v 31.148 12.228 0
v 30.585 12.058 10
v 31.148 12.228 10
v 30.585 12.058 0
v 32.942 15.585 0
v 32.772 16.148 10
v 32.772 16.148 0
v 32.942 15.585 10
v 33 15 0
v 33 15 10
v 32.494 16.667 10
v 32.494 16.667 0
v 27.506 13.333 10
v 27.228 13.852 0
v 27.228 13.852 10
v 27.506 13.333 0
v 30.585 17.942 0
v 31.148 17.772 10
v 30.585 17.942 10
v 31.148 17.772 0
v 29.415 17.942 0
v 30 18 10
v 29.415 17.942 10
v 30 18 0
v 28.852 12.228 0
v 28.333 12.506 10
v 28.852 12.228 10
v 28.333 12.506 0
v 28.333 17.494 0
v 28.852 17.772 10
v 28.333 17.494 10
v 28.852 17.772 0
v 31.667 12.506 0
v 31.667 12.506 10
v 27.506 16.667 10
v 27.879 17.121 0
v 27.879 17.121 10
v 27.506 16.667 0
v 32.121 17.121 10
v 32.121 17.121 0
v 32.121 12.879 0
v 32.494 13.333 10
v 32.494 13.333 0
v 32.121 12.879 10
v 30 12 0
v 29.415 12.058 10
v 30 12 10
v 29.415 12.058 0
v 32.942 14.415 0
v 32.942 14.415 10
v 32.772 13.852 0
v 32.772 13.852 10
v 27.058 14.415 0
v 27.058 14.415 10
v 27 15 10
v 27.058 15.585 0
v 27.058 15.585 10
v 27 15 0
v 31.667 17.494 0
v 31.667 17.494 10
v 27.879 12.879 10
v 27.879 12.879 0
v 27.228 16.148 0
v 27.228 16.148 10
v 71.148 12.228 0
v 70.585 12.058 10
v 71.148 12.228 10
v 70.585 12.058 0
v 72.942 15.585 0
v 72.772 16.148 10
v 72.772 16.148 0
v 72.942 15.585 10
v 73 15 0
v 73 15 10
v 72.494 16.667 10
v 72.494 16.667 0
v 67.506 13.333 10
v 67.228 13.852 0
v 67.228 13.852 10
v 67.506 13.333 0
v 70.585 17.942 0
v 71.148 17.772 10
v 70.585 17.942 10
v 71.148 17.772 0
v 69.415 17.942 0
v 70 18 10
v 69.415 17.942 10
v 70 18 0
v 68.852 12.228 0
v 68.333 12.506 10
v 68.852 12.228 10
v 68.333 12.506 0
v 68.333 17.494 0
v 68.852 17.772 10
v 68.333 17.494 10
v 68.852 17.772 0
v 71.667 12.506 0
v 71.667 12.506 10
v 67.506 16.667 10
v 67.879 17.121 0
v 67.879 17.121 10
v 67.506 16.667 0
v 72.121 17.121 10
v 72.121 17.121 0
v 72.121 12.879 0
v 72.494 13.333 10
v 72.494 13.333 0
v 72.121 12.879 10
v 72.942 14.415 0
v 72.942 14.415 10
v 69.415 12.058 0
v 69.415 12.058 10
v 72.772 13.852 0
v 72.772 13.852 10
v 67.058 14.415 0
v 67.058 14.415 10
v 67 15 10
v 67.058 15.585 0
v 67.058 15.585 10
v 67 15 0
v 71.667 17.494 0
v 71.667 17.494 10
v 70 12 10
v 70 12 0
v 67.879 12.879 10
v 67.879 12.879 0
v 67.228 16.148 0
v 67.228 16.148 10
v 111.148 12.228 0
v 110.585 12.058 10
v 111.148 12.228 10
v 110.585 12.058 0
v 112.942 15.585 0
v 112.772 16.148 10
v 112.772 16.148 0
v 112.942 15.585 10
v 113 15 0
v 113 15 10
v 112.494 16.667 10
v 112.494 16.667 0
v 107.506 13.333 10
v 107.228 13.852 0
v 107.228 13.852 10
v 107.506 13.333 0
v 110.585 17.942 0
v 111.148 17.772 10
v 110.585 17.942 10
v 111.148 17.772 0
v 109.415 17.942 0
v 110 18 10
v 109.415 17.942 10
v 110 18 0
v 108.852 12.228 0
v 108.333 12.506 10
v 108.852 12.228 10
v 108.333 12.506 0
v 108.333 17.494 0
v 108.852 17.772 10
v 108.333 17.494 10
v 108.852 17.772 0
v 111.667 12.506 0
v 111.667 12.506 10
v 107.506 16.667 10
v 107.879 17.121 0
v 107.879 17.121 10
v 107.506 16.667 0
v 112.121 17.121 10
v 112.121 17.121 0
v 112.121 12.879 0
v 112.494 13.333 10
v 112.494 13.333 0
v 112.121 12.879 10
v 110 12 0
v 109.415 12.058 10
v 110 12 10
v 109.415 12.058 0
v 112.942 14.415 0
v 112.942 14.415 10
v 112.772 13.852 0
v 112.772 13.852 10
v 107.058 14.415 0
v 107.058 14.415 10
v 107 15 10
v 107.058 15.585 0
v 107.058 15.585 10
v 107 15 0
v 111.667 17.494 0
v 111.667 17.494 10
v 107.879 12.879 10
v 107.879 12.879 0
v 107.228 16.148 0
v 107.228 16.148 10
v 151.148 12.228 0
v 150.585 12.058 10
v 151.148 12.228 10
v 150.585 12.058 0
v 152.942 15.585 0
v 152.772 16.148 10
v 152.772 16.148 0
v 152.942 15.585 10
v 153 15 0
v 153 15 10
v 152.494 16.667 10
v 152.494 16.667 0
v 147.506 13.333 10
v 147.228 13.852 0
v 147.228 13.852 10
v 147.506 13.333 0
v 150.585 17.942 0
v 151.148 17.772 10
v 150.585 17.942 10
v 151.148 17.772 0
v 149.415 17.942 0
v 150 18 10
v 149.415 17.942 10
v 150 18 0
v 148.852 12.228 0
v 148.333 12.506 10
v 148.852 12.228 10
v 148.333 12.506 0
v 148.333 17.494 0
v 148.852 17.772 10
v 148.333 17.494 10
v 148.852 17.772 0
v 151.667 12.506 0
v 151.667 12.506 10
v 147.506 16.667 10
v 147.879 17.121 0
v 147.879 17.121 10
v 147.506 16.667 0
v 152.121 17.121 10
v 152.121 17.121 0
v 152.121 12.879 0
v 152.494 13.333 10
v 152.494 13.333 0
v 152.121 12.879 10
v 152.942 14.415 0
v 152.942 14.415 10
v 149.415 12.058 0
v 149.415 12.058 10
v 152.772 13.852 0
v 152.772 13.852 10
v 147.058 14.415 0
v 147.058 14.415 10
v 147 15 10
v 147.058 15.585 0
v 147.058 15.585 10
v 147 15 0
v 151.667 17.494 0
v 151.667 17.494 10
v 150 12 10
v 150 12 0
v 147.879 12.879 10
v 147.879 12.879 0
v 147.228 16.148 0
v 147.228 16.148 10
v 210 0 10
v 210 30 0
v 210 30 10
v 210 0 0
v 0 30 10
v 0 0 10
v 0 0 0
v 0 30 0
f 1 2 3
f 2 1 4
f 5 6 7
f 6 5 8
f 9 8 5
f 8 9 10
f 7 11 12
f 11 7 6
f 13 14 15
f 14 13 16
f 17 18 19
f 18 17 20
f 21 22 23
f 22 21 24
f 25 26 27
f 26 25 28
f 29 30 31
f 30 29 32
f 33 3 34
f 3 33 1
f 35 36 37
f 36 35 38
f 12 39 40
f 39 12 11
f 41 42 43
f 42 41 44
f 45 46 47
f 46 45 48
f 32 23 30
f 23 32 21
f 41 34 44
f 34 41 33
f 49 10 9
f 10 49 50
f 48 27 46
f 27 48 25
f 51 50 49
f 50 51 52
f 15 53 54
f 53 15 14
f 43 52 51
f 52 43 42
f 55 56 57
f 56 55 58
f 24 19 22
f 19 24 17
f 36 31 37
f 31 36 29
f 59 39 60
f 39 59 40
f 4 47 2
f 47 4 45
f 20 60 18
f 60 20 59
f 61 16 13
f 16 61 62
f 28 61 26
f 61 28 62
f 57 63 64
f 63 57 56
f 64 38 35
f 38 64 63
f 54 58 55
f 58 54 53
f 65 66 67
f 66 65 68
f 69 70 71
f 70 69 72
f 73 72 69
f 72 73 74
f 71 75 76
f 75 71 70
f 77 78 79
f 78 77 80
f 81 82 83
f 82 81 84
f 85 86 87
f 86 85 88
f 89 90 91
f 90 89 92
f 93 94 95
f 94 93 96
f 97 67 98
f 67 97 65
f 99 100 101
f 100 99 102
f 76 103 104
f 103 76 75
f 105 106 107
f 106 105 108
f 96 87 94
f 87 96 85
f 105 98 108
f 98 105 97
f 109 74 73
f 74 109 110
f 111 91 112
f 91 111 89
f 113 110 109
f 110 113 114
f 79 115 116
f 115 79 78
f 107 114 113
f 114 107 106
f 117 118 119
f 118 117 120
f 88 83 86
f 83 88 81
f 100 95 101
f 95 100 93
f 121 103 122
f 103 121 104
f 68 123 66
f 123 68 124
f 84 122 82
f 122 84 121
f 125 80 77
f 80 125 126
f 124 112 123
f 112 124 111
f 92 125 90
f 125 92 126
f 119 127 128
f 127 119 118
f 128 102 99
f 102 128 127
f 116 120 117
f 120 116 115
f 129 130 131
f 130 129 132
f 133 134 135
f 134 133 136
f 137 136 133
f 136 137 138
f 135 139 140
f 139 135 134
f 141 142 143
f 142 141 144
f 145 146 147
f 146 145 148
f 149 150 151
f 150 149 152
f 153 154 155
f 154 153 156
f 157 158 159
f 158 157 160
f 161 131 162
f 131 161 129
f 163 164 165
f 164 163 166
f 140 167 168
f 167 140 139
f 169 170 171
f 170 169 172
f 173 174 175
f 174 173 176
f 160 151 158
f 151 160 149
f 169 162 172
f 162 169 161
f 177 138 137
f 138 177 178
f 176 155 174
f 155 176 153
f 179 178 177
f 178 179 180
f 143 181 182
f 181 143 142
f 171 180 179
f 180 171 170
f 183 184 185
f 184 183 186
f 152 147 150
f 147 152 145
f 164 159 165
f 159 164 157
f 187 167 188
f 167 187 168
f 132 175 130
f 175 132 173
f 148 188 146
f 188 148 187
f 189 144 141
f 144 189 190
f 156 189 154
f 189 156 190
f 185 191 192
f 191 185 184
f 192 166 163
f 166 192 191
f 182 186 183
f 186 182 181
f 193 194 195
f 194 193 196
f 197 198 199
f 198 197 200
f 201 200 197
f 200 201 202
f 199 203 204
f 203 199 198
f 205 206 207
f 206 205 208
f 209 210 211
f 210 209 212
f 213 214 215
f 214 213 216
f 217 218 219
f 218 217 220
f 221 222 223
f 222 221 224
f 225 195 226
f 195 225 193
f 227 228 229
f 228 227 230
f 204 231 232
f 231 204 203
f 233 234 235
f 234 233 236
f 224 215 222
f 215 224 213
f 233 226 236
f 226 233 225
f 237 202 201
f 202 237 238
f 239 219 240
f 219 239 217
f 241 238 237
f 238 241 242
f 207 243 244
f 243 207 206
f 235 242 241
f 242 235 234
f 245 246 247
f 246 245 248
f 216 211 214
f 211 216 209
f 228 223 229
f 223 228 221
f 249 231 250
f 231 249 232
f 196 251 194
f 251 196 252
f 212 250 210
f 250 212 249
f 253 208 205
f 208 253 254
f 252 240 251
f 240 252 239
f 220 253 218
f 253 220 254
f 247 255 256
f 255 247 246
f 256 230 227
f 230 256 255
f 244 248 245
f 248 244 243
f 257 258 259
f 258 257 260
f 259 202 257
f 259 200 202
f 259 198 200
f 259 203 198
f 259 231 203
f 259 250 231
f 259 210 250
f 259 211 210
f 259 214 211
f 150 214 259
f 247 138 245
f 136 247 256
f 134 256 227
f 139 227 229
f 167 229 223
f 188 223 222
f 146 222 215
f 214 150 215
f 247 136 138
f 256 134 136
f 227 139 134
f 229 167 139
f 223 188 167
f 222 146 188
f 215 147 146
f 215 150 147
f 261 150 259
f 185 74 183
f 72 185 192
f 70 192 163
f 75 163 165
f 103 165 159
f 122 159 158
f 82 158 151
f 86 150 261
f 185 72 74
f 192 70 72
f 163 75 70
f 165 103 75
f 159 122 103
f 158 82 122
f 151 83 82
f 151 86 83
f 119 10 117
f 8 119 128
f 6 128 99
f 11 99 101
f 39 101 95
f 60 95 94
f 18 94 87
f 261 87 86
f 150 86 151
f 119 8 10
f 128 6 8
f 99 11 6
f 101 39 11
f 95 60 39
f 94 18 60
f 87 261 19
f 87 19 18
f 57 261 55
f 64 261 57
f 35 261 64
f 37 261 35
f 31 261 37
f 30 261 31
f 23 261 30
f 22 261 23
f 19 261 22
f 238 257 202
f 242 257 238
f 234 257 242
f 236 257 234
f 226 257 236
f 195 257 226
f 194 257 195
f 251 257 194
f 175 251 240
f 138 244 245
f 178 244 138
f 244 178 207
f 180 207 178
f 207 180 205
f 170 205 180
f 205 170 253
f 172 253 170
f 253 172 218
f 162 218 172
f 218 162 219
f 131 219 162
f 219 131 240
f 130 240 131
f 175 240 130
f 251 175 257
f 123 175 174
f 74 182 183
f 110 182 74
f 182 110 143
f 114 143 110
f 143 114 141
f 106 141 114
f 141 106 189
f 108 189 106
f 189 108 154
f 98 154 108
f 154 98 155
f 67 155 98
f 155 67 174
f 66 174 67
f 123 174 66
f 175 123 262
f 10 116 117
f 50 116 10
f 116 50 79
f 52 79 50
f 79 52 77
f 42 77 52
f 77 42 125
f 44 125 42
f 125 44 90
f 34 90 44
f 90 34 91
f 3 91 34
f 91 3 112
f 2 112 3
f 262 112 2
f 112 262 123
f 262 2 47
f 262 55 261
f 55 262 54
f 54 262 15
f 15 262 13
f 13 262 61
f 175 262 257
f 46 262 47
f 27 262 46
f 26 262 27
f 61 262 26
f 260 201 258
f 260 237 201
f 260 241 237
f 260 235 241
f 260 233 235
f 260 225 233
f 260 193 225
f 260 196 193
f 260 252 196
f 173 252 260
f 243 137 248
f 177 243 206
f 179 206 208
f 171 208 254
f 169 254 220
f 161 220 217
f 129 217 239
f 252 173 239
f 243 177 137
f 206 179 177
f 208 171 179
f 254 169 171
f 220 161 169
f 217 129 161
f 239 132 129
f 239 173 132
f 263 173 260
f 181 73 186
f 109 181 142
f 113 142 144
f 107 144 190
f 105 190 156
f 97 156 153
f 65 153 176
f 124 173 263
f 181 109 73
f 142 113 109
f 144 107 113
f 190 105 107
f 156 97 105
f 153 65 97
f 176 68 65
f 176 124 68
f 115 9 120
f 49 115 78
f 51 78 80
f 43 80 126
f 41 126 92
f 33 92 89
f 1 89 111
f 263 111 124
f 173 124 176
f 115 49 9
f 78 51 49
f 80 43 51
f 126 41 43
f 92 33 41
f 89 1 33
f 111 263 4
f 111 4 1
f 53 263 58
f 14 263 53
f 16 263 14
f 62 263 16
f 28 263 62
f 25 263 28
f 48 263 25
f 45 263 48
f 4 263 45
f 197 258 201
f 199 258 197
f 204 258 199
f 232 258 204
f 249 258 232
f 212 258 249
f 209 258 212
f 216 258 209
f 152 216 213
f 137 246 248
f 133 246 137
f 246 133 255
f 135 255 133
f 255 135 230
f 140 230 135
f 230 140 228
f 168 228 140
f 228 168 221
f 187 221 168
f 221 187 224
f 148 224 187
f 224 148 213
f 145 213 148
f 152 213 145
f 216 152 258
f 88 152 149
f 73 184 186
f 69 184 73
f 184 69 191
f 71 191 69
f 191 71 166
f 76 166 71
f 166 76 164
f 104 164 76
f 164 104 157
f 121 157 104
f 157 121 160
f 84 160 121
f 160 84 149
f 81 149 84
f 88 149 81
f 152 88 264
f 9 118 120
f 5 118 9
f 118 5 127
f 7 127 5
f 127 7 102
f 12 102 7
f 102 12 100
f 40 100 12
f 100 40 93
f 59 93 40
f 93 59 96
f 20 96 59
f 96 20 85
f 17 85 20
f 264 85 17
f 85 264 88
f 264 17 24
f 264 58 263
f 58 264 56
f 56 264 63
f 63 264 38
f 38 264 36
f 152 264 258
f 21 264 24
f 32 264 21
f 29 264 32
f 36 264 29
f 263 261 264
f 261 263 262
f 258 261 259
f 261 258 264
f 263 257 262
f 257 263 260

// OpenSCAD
$fn = 32;

// ----------------------------------------------------------------------
// Long rail: 200-250 mm mounting rail
// ----------------------------------------------------------------------

// --- parameters (mm) ---
rail_l = 210;             // rail length, X
rail_w = 30;              // rail width, Y
rail_t = 10;              // rail thickness, Z
hole_d = 6;               // mounting hole diameter
hole_start = 30;          // first hole offset from the end
hole_pitch = 40;          // hole pitch
holes = 4;                // number of holes

difference() {
  cube([rail_l, rail_w, rail_t]);
  for (i = [0 : holes - 1])
    translate([hole_start + i * hole_pitch, rail_w / 2, -1])
      cylinder(h = rail_t + 2, d = hole_d);
}
